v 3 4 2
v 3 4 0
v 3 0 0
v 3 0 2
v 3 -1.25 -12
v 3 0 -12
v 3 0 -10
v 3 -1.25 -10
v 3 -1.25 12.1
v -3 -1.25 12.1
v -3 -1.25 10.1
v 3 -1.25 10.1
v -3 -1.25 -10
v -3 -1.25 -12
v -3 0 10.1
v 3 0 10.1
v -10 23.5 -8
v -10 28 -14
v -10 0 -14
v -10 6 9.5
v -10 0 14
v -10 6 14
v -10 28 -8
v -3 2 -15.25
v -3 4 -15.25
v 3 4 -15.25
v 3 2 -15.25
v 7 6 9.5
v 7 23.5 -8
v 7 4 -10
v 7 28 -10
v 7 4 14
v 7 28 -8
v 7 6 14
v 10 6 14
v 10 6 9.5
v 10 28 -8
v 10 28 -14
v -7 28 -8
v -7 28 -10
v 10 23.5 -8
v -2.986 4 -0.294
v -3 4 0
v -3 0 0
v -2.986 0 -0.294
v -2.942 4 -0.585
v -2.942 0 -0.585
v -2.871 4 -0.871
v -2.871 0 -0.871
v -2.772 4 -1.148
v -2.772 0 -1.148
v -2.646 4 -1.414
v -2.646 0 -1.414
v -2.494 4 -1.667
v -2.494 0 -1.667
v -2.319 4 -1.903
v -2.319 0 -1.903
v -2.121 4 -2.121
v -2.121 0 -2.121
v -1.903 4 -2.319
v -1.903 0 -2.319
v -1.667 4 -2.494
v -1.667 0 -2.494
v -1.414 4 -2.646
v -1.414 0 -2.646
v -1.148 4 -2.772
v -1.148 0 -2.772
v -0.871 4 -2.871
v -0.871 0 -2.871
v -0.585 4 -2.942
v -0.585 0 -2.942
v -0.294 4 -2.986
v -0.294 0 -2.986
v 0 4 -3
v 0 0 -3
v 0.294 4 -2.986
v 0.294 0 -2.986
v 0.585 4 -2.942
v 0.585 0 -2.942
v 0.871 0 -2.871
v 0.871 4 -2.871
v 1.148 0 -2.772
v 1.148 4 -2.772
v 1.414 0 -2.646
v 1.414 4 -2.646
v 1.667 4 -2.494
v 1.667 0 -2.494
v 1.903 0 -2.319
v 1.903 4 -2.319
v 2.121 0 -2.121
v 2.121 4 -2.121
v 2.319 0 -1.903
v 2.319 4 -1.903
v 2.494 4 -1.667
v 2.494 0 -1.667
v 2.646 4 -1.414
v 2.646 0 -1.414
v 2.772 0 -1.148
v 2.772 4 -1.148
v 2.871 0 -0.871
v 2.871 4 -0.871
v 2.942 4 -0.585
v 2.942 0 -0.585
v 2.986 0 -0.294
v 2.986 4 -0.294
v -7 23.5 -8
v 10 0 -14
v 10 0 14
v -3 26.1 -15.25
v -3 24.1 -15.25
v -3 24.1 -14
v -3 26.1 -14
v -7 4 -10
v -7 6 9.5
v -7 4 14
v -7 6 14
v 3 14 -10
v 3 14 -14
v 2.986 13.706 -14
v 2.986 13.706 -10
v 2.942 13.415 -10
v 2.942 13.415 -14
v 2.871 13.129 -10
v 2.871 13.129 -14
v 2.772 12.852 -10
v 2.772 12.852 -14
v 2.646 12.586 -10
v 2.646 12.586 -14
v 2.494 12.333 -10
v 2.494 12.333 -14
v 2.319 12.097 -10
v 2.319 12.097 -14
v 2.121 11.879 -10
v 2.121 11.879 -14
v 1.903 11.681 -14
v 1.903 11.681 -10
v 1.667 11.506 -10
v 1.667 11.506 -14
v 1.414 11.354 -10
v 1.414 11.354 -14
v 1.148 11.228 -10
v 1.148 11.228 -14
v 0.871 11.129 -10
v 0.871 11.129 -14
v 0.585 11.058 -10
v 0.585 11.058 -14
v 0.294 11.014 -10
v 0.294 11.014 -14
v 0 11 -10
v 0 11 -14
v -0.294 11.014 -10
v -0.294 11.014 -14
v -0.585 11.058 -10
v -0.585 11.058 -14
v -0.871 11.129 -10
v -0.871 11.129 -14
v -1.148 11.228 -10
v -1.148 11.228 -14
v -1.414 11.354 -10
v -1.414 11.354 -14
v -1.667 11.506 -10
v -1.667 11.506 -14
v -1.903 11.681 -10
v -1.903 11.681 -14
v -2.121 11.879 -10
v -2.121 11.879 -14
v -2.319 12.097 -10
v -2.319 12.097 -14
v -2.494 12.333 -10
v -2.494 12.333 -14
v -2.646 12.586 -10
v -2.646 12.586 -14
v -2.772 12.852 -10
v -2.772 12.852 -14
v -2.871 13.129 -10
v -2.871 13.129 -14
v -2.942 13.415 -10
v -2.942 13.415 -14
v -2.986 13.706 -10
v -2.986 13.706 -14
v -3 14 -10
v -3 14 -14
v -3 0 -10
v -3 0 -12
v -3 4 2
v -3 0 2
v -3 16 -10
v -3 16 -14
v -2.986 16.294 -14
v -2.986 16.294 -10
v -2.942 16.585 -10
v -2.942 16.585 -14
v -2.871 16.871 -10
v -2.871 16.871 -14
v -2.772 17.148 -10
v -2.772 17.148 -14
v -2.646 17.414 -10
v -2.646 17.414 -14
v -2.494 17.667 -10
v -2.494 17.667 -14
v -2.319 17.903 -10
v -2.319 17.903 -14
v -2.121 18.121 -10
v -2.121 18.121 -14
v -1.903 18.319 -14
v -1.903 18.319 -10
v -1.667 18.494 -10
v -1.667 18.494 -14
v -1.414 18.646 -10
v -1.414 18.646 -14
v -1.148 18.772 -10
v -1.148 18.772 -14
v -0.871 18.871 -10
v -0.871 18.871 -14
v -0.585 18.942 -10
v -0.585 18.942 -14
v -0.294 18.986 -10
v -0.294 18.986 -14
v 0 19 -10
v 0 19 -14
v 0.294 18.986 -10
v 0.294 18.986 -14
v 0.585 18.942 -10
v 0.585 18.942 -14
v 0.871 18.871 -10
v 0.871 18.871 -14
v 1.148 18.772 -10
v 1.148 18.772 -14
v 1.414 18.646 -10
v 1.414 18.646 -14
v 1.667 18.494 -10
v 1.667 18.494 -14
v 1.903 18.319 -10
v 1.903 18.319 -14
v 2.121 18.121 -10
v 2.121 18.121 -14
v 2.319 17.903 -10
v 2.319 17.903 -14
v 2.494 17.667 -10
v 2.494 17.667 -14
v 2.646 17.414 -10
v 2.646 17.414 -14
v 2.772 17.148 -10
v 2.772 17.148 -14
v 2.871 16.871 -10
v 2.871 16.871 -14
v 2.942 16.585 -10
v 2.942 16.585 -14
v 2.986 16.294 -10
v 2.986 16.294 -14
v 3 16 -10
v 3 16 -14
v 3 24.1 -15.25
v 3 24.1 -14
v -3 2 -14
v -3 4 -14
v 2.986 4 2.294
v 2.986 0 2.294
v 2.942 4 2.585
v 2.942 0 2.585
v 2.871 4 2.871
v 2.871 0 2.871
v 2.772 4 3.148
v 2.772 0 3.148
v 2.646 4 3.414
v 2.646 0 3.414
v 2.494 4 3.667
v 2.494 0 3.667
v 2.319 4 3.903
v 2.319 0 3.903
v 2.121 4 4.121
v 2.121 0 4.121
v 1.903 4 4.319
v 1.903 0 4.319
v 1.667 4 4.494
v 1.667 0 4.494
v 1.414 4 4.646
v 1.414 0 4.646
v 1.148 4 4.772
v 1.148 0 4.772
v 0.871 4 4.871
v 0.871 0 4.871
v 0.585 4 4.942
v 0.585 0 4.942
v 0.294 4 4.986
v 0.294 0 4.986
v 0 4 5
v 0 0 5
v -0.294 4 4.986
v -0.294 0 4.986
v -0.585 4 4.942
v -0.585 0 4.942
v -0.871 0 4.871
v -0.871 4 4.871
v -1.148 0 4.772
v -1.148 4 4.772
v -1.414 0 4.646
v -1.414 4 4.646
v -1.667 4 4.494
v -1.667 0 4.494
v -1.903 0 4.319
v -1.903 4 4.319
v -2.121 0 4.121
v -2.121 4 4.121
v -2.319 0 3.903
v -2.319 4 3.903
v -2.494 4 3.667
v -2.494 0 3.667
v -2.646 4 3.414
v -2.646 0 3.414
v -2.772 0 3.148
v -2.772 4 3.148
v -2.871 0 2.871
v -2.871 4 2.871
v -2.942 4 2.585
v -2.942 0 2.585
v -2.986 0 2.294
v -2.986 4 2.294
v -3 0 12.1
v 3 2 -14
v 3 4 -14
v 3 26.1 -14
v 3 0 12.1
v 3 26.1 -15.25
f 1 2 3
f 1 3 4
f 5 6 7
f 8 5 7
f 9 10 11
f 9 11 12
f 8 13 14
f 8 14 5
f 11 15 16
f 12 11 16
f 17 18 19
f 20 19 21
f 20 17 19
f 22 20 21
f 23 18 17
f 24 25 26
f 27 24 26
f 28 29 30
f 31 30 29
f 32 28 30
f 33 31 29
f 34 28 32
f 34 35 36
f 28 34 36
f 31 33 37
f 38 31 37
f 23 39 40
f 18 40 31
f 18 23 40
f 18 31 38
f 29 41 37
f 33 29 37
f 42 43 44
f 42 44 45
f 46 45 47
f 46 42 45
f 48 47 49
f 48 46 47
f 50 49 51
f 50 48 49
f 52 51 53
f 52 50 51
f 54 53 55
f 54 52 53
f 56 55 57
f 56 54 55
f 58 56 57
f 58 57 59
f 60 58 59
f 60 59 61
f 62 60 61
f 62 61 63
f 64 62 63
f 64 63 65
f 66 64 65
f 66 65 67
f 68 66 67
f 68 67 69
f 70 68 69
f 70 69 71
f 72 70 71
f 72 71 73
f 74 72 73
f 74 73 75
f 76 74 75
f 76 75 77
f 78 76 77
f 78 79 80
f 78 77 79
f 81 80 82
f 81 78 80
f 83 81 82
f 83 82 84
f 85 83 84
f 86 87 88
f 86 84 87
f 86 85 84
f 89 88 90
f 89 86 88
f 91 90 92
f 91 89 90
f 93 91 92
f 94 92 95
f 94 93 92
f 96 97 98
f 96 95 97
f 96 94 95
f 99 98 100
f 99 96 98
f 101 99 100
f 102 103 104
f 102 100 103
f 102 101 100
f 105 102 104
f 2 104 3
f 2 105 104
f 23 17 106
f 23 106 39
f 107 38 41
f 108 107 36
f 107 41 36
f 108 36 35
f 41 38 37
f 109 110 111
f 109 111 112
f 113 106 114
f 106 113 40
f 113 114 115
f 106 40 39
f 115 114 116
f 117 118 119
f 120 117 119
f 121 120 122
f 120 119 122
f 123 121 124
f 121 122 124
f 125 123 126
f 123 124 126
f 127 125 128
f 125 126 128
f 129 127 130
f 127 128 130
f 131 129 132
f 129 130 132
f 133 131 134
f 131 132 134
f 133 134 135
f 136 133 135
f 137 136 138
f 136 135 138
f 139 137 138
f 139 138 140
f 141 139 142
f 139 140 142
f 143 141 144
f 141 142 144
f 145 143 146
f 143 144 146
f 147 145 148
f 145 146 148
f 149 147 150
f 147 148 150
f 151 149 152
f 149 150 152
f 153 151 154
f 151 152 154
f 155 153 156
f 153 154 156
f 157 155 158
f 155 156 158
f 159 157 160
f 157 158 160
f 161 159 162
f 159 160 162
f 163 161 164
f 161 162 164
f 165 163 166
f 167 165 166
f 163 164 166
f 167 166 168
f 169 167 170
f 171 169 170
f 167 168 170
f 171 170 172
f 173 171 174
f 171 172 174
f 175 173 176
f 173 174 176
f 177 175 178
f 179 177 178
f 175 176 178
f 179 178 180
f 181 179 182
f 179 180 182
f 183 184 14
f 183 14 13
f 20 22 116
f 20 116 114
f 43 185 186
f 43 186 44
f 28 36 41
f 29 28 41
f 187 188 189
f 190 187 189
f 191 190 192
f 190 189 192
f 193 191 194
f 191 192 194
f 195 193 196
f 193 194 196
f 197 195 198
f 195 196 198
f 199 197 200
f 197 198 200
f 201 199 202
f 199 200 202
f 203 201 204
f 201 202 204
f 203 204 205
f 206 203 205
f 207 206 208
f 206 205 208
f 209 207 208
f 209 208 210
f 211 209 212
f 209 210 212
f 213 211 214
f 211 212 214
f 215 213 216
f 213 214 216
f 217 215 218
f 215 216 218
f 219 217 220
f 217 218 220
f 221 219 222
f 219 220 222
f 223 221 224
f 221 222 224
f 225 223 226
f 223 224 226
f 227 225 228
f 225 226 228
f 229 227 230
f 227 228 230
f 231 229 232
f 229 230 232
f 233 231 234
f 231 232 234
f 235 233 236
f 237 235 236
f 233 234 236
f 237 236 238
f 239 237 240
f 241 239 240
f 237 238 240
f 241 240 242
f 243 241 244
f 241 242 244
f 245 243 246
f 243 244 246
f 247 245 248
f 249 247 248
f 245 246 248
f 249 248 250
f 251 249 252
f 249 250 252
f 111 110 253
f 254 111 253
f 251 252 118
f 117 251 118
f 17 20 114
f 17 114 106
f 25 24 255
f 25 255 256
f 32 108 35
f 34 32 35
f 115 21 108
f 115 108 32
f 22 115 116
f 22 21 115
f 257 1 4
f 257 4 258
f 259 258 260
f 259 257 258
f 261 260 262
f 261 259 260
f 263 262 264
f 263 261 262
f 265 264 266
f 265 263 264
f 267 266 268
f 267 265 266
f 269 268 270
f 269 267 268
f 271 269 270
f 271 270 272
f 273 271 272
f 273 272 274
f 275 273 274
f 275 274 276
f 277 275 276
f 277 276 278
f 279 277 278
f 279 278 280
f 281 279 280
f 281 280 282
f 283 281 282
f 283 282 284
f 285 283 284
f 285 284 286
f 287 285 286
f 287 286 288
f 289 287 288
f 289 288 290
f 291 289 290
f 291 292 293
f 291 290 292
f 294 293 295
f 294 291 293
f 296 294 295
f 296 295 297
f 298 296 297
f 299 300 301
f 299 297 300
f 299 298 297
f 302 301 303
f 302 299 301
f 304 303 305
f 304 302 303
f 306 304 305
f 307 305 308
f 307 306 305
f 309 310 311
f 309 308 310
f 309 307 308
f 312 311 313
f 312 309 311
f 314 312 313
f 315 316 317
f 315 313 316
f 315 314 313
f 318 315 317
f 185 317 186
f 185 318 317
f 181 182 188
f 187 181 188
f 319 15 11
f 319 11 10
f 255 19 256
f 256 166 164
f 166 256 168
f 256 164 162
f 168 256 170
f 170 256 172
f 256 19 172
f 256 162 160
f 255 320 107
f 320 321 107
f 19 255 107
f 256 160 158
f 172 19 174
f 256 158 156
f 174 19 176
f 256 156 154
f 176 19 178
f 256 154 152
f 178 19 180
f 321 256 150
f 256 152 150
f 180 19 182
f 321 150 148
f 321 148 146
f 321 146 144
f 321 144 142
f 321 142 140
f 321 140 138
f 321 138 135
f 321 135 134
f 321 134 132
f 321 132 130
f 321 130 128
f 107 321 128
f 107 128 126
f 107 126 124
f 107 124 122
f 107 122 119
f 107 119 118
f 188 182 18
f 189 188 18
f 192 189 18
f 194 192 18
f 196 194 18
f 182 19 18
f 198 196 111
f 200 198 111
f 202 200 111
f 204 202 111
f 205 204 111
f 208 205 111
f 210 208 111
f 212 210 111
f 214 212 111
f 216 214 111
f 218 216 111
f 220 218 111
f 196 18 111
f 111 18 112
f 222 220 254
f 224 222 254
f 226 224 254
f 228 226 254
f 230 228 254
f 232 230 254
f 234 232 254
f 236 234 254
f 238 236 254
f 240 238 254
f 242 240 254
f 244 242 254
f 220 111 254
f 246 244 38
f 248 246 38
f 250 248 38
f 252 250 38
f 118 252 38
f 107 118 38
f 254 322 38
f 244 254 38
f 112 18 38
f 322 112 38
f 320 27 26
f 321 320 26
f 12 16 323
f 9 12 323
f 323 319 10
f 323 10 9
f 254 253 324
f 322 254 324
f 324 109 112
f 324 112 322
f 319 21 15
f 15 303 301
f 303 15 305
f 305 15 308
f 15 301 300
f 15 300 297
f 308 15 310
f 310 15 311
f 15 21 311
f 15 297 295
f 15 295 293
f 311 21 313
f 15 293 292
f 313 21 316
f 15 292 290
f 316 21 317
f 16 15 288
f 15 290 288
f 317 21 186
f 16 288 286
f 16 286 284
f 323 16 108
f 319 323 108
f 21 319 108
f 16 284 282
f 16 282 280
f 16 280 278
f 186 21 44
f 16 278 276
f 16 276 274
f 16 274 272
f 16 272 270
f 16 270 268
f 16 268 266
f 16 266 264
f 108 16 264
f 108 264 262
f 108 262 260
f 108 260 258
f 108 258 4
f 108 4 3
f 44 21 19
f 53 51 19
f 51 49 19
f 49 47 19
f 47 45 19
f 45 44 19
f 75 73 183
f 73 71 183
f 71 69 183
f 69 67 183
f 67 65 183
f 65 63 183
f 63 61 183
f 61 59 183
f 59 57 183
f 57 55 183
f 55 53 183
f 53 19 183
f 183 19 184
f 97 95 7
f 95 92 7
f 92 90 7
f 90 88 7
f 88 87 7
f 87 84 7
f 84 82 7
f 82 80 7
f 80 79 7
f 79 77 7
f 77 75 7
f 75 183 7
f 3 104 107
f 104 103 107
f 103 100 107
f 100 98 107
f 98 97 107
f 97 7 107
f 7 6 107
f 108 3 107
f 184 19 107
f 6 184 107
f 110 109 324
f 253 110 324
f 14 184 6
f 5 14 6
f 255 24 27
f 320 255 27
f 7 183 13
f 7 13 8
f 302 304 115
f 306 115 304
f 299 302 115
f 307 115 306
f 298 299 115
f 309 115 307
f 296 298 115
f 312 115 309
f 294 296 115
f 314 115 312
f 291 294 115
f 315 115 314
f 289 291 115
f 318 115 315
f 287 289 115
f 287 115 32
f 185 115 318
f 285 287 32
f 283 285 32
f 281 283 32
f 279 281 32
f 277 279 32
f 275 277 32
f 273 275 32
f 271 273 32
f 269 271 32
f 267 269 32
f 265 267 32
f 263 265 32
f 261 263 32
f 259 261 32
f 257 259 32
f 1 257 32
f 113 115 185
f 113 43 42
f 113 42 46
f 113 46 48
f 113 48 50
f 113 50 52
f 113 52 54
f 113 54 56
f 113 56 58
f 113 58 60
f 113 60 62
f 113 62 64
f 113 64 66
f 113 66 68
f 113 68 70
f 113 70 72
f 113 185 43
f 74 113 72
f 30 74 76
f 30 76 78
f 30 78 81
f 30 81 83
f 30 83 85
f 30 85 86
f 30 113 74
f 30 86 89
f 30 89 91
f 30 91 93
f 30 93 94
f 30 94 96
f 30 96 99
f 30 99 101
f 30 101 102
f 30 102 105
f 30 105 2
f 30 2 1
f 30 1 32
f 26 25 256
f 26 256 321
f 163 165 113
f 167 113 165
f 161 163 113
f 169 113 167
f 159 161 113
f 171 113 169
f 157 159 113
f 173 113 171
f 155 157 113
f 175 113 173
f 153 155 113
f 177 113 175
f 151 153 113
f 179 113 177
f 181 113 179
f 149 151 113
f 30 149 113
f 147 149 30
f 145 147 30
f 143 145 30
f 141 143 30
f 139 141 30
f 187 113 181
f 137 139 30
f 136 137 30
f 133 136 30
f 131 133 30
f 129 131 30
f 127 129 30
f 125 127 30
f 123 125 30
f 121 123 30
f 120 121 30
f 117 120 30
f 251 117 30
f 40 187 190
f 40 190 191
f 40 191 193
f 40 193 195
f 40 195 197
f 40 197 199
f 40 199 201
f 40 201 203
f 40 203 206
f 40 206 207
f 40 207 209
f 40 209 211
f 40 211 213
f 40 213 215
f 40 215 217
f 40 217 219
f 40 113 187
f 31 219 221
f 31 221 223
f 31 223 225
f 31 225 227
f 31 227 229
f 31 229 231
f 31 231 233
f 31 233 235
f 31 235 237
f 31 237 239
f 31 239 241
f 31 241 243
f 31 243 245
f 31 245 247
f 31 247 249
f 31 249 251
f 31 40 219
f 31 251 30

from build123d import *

# Parameters (mm, degrees)
SKETCH1_W           = 20
SKETCH1_H           = 28
BOSS_EXTRUDE1_DEPTH = 4
CUT_EXTRUDE1_DEPTH  = 18.663521733
SKETCH4_W           = 6
SKETCH4_H           = 2
BOSS_EXTRUDE2_DEPTH = 1.25
BOSS_EXTRUDE3_DEPTH = 3


with BuildPart() as part:
    # Sketch1 → Boss-Extrude1 (new body)
    with BuildSketch(Plane(origin=(0, 0, 0), x_dir=(1, 0, 0), z_dir=(0, 1, 0))):
        Rectangle(SKETCH1_W, SKETCH1_H)
    boss_extrude1 = extrude(amount=BOSS_EXTRUDE1_DEPTH)

    # Sketch3 → Cut-Extrude1 (cut, through all)
    with BuildSketch(Plane(origin=(0, 4, 0), x_dir=(1, 0, 0), z_dir=(0, 1, 0))):
        with BuildLine():
            Line((3, 0), (3, -2))
            ThreePointArc((3, -2), (0, -5), (-3, -2))
            Line((-3, -2), (-3, 0))
            ThreePointArc((-3, 0), (0, 3), (3, 0))
        make_face()
    cut_extrude1 = extrude(amount=-CUT_EXTRUDE1_DEPTH, mode=Mode.SUBTRACT)

    # Sketch4 → Boss-Extrude2 (add)
    with BuildSketch(Plane.XZ):
        with Locations((0, 11.1)):
            Rectangle(SKETCH4_W, SKETCH4_H)
        with Locations((0, -11)):
            Rectangle(SKETCH4_W, SKETCH4_H)
    boss_extrude2 = extrude(amount=BOSS_EXTRUDE2_DEPTH)

    # Mirror1: Boss-Extrude1, Cut-Extrude1, Boss-Extrude2 across plane
    add(boss_extrude1.mirror(Plane(origin=(0, 7, -7), x_dir=(0, 0.7071067811865478, 0.7071067811865472), z_dir=(0, -0.7071067811865475, 0.7071067811865477))))
    add(cut_extrude1.mirror(Plane(origin=(0, 7, -7), x_dir=(0, 0.7071067811865478, 0.7071067811865472), z_dir=(0, -0.7071067811865475, 0.7071067811865477))), mode=Mode.SUBTRACT)
    add(boss_extrude2.mirror(Plane(origin=(0, 7, -7), x_dir=(0, 0.7071067811865478, 0.7071067811865472), z_dir=(0, -0.7071067811865475, 0.7071067811865477))))

    # Sketch5 → Boss-Extrude3 (add)
    with BuildSketch(Plane(origin=(10, 0, 0), x_dir=(0, 0, -1), z_dir=(1, 0, 0))):
        Polygon((-14, 4), (-14, 6), (-9.5, 6), (8, 23.5), (8, 28), (10, 28), (10, 4), align=None)
    boss_extrude3 = extrude(amount=-BOSS_EXTRUDE3_DEPTH)

    # Mirror2: Boss-Extrude3 across plane
    add(boss_extrude3.mirror(Plane(origin=(0, 0, 0), x_dir=(0, 0, 1), z_dir=(1, 0, 0))))


solid = part.part
